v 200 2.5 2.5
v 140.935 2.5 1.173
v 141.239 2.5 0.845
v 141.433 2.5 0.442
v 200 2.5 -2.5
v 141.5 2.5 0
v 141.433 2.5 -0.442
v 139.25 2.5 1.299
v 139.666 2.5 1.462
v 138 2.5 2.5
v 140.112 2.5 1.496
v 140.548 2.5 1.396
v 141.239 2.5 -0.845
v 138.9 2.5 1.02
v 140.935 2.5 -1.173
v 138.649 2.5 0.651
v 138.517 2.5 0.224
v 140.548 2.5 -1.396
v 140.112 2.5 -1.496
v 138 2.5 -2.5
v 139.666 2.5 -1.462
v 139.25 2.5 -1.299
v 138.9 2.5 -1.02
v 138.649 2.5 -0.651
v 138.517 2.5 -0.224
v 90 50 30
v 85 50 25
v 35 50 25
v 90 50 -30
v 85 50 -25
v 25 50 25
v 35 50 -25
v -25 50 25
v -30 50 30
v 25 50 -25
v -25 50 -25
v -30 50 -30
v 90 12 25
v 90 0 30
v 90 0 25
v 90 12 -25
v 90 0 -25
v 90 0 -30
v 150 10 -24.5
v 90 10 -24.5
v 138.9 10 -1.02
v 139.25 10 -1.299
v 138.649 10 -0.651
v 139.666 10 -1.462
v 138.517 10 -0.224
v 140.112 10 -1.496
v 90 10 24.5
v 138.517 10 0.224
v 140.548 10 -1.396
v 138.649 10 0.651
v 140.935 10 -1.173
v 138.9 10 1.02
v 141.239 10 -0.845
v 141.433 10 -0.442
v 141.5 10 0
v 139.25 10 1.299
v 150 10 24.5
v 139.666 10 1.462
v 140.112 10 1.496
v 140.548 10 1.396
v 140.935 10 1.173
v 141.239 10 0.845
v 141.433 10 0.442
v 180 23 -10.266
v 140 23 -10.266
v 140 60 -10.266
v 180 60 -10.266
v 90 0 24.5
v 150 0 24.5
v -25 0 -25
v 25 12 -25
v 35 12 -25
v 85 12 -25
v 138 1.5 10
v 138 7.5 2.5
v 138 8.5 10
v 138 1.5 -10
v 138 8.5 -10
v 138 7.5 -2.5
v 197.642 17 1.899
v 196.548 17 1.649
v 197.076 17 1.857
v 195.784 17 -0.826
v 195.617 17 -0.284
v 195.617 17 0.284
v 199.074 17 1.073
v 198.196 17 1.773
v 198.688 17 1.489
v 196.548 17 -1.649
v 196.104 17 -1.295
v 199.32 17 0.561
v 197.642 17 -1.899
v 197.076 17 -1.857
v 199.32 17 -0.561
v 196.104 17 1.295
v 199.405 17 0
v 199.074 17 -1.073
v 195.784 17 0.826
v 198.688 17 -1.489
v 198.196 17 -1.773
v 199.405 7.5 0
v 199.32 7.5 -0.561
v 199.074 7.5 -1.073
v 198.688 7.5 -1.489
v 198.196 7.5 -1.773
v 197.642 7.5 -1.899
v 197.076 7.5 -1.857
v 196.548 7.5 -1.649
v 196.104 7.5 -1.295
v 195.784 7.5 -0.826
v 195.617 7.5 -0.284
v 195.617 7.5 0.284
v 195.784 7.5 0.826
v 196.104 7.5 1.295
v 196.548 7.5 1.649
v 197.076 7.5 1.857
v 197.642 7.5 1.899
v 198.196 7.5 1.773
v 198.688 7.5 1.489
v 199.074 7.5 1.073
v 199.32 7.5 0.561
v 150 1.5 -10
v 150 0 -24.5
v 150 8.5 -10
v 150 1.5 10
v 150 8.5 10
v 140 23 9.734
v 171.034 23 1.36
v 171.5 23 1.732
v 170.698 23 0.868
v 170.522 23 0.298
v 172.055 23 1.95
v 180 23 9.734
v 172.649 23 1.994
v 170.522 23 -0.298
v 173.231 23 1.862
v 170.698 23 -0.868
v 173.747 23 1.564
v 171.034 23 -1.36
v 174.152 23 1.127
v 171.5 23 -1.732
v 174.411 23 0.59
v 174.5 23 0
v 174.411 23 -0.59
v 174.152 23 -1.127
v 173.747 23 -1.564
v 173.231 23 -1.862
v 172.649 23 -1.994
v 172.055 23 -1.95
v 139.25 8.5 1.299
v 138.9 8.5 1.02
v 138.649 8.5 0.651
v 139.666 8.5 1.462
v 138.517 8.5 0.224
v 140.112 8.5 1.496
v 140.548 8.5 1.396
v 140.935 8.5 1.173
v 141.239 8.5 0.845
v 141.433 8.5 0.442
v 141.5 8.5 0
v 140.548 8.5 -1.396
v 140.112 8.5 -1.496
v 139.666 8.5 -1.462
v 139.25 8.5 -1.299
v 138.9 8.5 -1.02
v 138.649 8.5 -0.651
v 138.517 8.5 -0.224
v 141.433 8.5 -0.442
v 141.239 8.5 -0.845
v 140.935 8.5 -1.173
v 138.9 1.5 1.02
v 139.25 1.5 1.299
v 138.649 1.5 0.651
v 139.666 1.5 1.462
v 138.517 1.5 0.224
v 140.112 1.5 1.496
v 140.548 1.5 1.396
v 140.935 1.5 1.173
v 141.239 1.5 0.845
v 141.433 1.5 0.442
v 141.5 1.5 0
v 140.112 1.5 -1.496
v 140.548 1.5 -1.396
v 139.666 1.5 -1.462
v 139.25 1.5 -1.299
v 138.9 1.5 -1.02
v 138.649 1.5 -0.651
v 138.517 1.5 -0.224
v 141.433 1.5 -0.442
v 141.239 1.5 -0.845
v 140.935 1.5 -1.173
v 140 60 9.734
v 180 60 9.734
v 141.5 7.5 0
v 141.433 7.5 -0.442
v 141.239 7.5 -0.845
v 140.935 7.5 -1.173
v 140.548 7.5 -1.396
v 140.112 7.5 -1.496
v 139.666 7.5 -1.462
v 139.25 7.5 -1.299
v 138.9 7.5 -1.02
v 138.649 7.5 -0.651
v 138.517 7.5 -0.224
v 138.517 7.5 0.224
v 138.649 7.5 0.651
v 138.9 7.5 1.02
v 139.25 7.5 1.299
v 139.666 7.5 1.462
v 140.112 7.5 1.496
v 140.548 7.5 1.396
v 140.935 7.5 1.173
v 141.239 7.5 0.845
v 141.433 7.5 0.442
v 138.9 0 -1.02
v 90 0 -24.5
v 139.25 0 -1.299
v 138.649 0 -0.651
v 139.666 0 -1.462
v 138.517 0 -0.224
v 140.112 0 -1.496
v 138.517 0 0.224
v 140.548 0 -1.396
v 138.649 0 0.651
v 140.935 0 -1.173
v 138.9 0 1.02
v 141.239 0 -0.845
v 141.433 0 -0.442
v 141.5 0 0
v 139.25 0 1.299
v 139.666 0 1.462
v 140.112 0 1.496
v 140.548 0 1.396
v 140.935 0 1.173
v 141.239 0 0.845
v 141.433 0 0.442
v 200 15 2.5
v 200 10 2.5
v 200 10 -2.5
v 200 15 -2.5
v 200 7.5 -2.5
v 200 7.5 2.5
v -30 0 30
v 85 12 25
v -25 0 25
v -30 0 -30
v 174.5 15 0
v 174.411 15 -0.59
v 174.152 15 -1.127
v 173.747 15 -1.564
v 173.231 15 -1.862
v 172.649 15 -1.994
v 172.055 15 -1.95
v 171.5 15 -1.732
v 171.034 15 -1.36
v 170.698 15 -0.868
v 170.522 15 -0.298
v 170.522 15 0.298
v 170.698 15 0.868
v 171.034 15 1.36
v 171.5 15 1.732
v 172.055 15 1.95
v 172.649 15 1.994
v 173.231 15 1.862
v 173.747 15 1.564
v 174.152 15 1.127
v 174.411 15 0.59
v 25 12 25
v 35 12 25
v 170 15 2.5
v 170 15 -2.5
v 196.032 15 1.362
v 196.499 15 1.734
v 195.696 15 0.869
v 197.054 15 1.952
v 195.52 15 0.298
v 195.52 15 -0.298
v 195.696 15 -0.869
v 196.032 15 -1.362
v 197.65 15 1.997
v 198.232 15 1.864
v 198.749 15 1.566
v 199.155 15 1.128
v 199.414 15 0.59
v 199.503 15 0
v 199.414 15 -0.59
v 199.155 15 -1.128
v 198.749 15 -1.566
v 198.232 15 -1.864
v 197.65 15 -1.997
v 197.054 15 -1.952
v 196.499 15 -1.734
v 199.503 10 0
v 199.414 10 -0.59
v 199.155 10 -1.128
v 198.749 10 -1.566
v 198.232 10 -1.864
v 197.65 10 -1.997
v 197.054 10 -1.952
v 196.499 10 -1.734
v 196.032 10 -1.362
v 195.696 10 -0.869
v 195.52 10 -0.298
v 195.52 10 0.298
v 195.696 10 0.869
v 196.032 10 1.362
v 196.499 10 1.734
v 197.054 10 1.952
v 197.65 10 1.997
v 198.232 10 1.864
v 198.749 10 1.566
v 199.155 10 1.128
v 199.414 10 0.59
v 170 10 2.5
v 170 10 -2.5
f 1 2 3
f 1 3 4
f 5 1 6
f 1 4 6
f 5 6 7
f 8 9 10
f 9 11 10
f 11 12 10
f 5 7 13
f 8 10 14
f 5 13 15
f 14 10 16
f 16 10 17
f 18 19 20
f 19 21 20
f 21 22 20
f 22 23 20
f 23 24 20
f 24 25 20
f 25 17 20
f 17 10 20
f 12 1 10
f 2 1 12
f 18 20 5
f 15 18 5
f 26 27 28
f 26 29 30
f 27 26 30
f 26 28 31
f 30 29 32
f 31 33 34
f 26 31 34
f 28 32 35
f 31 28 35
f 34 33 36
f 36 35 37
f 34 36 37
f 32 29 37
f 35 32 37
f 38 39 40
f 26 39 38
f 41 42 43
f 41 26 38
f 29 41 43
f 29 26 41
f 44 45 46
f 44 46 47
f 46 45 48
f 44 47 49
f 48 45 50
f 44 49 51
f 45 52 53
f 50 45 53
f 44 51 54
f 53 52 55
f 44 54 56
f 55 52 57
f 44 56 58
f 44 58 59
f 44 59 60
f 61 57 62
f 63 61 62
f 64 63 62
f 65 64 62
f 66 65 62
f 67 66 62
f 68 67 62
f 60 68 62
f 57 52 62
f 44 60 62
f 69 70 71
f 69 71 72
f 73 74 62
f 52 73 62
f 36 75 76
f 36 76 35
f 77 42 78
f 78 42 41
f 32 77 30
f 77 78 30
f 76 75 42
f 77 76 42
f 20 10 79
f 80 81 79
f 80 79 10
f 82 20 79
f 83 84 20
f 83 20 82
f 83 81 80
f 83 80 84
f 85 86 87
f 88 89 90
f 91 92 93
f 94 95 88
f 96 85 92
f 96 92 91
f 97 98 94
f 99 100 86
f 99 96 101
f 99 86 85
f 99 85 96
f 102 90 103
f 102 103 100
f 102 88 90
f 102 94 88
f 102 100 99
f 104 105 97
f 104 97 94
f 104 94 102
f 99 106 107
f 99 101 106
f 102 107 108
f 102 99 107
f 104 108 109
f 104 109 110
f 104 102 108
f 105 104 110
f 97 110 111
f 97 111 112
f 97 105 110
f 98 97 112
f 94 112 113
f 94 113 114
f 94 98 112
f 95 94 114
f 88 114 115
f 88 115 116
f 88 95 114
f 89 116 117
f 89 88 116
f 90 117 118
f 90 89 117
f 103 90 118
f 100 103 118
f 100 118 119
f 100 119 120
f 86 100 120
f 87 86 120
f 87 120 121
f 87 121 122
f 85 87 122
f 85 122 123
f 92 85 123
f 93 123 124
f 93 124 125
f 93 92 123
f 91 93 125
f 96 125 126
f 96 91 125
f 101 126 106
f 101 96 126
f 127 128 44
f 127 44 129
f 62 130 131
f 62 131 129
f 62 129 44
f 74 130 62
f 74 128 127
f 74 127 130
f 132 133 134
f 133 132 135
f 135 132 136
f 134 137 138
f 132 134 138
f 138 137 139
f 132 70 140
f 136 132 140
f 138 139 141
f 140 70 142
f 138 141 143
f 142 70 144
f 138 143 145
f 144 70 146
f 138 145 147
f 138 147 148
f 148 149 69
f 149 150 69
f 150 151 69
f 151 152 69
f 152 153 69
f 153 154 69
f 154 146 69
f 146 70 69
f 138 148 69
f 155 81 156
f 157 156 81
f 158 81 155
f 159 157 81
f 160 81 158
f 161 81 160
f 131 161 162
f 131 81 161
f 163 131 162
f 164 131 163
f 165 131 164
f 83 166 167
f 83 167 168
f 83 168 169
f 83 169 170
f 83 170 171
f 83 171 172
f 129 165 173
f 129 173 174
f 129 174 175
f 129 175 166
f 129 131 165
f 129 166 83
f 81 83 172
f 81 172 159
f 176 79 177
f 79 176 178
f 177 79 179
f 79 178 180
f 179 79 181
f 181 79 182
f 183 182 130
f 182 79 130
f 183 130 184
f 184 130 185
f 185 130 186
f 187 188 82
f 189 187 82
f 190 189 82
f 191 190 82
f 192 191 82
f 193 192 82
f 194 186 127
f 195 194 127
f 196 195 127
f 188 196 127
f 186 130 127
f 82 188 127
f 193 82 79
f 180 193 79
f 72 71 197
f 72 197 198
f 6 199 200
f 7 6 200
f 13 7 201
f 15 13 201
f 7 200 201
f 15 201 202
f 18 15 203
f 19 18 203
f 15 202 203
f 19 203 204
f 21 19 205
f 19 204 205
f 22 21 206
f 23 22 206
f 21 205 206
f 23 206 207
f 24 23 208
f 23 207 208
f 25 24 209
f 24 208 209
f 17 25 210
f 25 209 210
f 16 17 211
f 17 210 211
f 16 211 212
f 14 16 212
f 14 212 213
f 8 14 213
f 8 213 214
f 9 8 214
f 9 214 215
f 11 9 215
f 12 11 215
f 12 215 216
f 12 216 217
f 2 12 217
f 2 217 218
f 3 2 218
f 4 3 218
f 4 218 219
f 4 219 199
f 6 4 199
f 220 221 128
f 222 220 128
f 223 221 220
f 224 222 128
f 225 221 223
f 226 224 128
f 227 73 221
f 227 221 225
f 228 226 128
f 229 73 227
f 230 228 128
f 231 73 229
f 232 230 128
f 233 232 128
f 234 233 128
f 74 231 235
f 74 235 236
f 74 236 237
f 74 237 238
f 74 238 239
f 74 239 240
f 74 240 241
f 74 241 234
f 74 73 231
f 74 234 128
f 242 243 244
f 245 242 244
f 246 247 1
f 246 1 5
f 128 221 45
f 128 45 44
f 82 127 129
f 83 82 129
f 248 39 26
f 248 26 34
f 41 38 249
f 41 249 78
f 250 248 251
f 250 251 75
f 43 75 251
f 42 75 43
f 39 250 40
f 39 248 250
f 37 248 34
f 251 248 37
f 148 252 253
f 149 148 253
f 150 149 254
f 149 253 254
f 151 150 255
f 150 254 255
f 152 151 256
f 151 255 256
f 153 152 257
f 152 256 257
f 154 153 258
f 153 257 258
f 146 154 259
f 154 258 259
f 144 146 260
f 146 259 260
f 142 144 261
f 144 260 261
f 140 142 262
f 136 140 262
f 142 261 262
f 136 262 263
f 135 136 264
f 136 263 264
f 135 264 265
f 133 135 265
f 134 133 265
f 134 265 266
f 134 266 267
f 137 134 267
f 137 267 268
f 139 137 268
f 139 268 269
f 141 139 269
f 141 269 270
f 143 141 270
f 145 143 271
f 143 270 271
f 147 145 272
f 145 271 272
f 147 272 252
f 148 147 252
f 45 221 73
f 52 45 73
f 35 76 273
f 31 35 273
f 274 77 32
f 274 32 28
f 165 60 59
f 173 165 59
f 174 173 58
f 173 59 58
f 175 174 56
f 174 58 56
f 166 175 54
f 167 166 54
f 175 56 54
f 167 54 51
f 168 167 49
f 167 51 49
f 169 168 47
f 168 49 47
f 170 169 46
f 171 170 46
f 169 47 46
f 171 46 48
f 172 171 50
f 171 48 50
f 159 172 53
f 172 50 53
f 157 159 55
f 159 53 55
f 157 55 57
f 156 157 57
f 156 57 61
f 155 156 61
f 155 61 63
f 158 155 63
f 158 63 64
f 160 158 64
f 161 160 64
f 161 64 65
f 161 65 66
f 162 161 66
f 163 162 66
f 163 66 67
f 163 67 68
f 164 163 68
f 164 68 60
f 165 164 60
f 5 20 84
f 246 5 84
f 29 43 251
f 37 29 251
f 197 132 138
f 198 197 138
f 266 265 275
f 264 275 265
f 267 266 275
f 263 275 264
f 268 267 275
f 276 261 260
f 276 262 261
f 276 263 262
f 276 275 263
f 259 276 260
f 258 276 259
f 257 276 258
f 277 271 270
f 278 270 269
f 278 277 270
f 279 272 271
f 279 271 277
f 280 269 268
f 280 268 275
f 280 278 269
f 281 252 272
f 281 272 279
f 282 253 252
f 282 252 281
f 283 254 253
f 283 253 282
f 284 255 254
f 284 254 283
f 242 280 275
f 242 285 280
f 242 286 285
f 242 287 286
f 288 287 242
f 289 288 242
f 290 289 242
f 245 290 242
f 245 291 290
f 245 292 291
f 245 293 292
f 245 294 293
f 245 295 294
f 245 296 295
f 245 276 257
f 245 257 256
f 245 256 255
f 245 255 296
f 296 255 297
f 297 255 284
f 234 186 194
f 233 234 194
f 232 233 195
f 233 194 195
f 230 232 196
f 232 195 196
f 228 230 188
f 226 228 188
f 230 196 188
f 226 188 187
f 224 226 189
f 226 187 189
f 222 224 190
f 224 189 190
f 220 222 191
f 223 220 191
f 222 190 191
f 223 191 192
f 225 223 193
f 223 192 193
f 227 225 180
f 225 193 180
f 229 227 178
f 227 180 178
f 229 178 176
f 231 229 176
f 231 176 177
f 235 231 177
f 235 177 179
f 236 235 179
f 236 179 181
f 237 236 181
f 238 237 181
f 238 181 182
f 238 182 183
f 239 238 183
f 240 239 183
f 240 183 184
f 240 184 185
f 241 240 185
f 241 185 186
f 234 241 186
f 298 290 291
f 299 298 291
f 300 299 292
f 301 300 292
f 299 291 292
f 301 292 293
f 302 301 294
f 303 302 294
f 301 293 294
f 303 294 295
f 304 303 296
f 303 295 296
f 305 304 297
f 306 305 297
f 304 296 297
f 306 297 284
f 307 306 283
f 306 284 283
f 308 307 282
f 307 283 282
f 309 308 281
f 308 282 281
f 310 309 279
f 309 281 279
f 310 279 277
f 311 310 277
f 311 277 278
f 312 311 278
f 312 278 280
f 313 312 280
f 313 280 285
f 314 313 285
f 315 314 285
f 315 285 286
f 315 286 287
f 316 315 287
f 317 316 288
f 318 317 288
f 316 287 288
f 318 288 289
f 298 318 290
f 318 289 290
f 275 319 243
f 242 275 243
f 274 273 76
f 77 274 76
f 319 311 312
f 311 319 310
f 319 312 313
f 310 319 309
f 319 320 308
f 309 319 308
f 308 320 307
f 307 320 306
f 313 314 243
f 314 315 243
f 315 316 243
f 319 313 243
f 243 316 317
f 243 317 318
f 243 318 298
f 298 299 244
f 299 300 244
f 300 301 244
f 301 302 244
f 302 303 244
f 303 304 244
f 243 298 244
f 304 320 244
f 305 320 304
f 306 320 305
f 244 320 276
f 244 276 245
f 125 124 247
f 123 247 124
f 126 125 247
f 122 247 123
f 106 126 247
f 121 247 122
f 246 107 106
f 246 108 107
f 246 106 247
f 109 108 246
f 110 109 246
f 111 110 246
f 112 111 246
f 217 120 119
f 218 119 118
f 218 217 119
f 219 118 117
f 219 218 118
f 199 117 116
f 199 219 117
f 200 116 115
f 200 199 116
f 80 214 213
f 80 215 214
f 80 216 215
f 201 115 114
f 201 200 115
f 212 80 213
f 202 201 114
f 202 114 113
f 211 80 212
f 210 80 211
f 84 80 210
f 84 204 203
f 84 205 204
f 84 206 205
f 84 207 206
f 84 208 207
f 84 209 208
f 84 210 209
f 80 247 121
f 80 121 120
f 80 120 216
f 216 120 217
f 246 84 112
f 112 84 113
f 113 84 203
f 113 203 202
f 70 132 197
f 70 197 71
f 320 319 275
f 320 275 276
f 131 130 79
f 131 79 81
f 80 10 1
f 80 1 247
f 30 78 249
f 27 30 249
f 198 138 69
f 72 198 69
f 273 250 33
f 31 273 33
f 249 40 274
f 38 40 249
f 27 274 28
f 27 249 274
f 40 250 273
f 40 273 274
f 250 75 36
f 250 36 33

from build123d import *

# Parameters (mm, degrees)
SKETCH_1_W                = 60
SKETCH_1_H                = 60
EXTRUDE_1_DEPTH           = 50
SKETCH_2_W                = 50
SKETCH_2_H                = 50
CUT_EXTRUDE_1_DEPTH       = 51
SKETCH_3_W                = 50
SKETCH_3_H                = 12
CUT_EXTRUDE_2_DEPTH       = 10
SKETCH_4_W                = 50
SKETCH_4_H                = 12
CUT_EXTRUDE_3_DEPTH       = 10
SKETCH_6_W                = 60
SKETCH_6_H                = 50
EXTRUDE_2_DEPTH           = 10
SKETCH_8_W                = 1
SKETCH_8_H                = 10
CUT_EXTRUDE_5_DEPTH       = 60
SKETCH_13_W               = 14
SKETCH_13_H               = 7
CUT_EXTRUDE_6_DEPTH       = 12
SKETCH_14_W               = 5
SKETCH_14_H               = 5
EXTRUDE_4_DEPTH           = 62
SKETCH_15_W               = 3
SKETCH_15_H               = 7
CUT_EXTRUDE_7_DEPTH       = 12
SKETCH_16_W               = 3
SKETCH_16_H               = 7
CUT_EXTRUDE_8_DEPTH       = 12
SKETCH_18_W               = 30
SKETCH_18_H               = 5
EXTRUDE_5_DEPTH           = 5
SKETCH_19_R               = 2.002523802
CUT_EXTRUDE_9_DEPTH       = 5
SKETCH_20_R               = 1.5
CUT_EXTRUDE_10_DEPTH      = 41
CUT_EXTRUDE_10_DEPTH_BACK = 11
SKETCH_21_R               = 1.9046057
EXTRUDE_6_DEPTH           = 2
EXTRUDE_6_DEPTH_BACK      = 8
SKETCH_22_R               = 2
EXTRUDE_7_DEPTH           = 8
SKETCH_23_W               = 40
SKETCH_23_H               = 20
EXTRUDE_8_DEPTH           = 37


with BuildPart() as part:
    # 草图1 → 凸台-拉伸1 (new body)
    with BuildSketch(Plane(origin=(0, 0, 0), x_dir=(1, 0, 0), z_dir=(0, 1, 0))):
        Rectangle(SKETCH_1_W, SKETCH_1_H)
    extrude_1 = extrude(amount=EXTRUDE_1_DEPTH)

    # 草图2 → 切除-拉伸1 (cut, through all)
    with BuildSketch(Plane.XZ):
        Rectangle(SKETCH_2_W, SKETCH_2_H)
    cut_extrude_1 = extrude(amount=-CUT_EXTRUDE_1_DEPTH, mode=Mode.SUBTRACT)

    # 草图3 → 切除-拉伸2 (cut)
    with BuildSketch(Plane(origin=(30, 0, 0), x_dir=(0, 0, -1), z_dir=(1, 0, 0))):
        with Locations((0, 6)):
            Rectangle(SKETCH_3_W, SKETCH_3_H)
    cut_extrude_2 = extrude(amount=-CUT_EXTRUDE_2_DEPTH, mode=Mode.SUBTRACT)

    # 镜向3: 凸台-拉伸1, 切除-拉伸1, 切除-拉伸2 across plane
    add(extrude_1.mirror(Plane(origin=(30, 50, -30), x_dir=(0, 0, 1), z_dir=(-1, 0, 0))))
    add(cut_extrude_1.mirror(Plane(origin=(30, 50, -30), x_dir=(0, 0, 1), z_dir=(-1, 0, 0))), mode=Mode.SUBTRACT)
    add(cut_extrude_2.mirror(Plane(origin=(30, 50, -30), x_dir=(0, 0, 1), z_dir=(-1, 0, 0))), mode=Mode.SUBTRACT)

    # 草图4 → 切除-拉伸3 (cut)
    with BuildSketch(Plane(origin=(90, 0, 0), x_dir=(0, 0, -1), z_dir=(1, 0, 0))):
        with Locations((0, 6)):
            Rectangle(SKETCH_4_W, SKETCH_4_H)
    extrude(amount=-CUT_EXTRUDE_3_DEPTH, mode=Mode.SUBTRACT)

    # 草图6 → 凸台-拉伸2 (add)
    with BuildSketch(Plane.XZ):
        with Locations((120, 0.5)):
            Rectangle(SKETCH_6_W, SKETCH_6_H)
    extrude(amount=-EXTRUDE_2_DEPTH)

    # 草图8 → 切除-拉伸5 (cut)
    with BuildSketch(Plane(origin=(150, 0, 0), x_dir=(0, 0, -1), z_dir=(1, 0, 0))):
        with Locations((-25, 5)):
            Rectangle(SKETCH_8_W, SKETCH_8_H)
    extrude(amount=-CUT_EXTRUDE_5_DEPTH, mode=Mode.SUBTRACT)

    # 草图13 → 切除-拉伸6 (cut)
    with BuildSketch(Plane(origin=(150, 0, 0), x_dir=(0, 0, -1), z_dir=(1, 0, 0))):
        with Locations((0, 5)):
            Rectangle(SKETCH_13_W, SKETCH_13_H)
    extrude(amount=-CUT_EXTRUDE_6_DEPTH, mode=Mode.SUBTRACT)

    # 草图14 → 凸台-拉伸4 (add)
    with BuildSketch(Plane(origin=(138, 0, 0), x_dir=(0, 0, -1), z_dir=(1, 0, 0))):
        with Locations((0, 5)):
            Rectangle(SKETCH_14_W, SKETCH_14_H)
    extrude(amount=EXTRUDE_4_DEPTH)

    # 草图15 → 切除-拉伸7 (cut)
    with BuildSketch(Plane(origin=(150, 0, 0), x_dir=(0, 0, -1), z_dir=(1, 0, 0))):
        with Locations((-8.5, 5)):
            Rectangle(SKETCH_15_W, SKETCH_15_H)
    extrude(amount=-CUT_EXTRUDE_7_DEPTH, mode=Mode.SUBTRACT)

    # 草图16 → 切除-拉伸8 (cut)
    with BuildSketch(Plane(origin=(150, 0, 0), x_dir=(0, 0, -1), z_dir=(1, 0, 0))):
        with Locations((8.5, 5)):
            Rectangle(SKETCH_16_W, SKETCH_16_H)
    extrude(amount=-CUT_EXTRUDE_8_DEPTH, mode=Mode.SUBTRACT)

    # 草图20 → 切除-拉伸10 (cut, two sides)
    with BuildSketch(Plane(origin=(0, 10, 0), x_dir=(1, 0, 0), z_dir=(0, 1, 0))) as cut_extrude_10_sk:
        with Locations((140, 0)):
            Circle(SKETCH_20_R)
    extrude(amount=CUT_EXTRUDE_10_DEPTH, mode=Mode.SUBTRACT)
    extrude(cut_extrude_10_sk.sketch, amount=-CUT_EXTRUDE_10_DEPTH_BACK, mode=Mode.SUBTRACT)

    # 草图21 → 凸台-拉伸6 (add, two sides)
    with BuildSketch(Plane(origin=(0, 15, 0), x_dir=(1, 0, 0), z_dir=(0, 1, 0))) as extrude_6_sk:
        with Locations((197.5, 0)):
            Circle(SKETCH_21_R)
    extrude(amount=EXTRUDE_6_DEPTH)
    extrude(extrude_6_sk.sketch, amount=-EXTRUDE_6_DEPTH_BACK)


with BuildPart() as body_2:
    # 草图18 → 凸台-拉伸5 (new body)
    with BuildSketch(Plane(origin=(0, 10, 0), x_dir=(1, 0, 0), z_dir=(0, 1, 0))):
        with Locations((185, 0)):
            Rectangle(SKETCH_18_W, SKETCH_18_H)
    extrude(amount=EXTRUDE_5_DEPTH)

    # 草图19 → 切除-拉伸9 (cut)
    with BuildSketch(Plane(origin=(0, 15, 0), x_dir=(1, 0, 0), z_dir=(0, 1, 0))):
        with Locations((197.5, 0)):
            Circle(SKETCH_19_R)
    extrude(amount=-CUT_EXTRUDE_9_DEPTH, mode=Mode.SUBTRACT)

    # 草图22 → 凸台-拉伸7 (add)
    with BuildSketch(Plane(origin=(0, 15, 0), x_dir=(1, 0, 0), z_dir=(0, 1, 0))):
        with Locations((172.5, 0)):
            Circle(SKETCH_22_R)
    extrude(amount=EXTRUDE_7_DEPTH)

    # 草图23 → 凸台-拉伸8 (add)
    with BuildSketch(Plane(origin=(0, 23, 0), x_dir=(1, 0, 0), z_dir=(0, 1, 0))):
        with Locations((160, 0.265830592)):
            Rectangle(SKETCH_23_W, SKETCH_23_H)
    extrude(amount=EXTRUDE_8_DEPTH)


solid = Compound([part.part, body_2.part])
